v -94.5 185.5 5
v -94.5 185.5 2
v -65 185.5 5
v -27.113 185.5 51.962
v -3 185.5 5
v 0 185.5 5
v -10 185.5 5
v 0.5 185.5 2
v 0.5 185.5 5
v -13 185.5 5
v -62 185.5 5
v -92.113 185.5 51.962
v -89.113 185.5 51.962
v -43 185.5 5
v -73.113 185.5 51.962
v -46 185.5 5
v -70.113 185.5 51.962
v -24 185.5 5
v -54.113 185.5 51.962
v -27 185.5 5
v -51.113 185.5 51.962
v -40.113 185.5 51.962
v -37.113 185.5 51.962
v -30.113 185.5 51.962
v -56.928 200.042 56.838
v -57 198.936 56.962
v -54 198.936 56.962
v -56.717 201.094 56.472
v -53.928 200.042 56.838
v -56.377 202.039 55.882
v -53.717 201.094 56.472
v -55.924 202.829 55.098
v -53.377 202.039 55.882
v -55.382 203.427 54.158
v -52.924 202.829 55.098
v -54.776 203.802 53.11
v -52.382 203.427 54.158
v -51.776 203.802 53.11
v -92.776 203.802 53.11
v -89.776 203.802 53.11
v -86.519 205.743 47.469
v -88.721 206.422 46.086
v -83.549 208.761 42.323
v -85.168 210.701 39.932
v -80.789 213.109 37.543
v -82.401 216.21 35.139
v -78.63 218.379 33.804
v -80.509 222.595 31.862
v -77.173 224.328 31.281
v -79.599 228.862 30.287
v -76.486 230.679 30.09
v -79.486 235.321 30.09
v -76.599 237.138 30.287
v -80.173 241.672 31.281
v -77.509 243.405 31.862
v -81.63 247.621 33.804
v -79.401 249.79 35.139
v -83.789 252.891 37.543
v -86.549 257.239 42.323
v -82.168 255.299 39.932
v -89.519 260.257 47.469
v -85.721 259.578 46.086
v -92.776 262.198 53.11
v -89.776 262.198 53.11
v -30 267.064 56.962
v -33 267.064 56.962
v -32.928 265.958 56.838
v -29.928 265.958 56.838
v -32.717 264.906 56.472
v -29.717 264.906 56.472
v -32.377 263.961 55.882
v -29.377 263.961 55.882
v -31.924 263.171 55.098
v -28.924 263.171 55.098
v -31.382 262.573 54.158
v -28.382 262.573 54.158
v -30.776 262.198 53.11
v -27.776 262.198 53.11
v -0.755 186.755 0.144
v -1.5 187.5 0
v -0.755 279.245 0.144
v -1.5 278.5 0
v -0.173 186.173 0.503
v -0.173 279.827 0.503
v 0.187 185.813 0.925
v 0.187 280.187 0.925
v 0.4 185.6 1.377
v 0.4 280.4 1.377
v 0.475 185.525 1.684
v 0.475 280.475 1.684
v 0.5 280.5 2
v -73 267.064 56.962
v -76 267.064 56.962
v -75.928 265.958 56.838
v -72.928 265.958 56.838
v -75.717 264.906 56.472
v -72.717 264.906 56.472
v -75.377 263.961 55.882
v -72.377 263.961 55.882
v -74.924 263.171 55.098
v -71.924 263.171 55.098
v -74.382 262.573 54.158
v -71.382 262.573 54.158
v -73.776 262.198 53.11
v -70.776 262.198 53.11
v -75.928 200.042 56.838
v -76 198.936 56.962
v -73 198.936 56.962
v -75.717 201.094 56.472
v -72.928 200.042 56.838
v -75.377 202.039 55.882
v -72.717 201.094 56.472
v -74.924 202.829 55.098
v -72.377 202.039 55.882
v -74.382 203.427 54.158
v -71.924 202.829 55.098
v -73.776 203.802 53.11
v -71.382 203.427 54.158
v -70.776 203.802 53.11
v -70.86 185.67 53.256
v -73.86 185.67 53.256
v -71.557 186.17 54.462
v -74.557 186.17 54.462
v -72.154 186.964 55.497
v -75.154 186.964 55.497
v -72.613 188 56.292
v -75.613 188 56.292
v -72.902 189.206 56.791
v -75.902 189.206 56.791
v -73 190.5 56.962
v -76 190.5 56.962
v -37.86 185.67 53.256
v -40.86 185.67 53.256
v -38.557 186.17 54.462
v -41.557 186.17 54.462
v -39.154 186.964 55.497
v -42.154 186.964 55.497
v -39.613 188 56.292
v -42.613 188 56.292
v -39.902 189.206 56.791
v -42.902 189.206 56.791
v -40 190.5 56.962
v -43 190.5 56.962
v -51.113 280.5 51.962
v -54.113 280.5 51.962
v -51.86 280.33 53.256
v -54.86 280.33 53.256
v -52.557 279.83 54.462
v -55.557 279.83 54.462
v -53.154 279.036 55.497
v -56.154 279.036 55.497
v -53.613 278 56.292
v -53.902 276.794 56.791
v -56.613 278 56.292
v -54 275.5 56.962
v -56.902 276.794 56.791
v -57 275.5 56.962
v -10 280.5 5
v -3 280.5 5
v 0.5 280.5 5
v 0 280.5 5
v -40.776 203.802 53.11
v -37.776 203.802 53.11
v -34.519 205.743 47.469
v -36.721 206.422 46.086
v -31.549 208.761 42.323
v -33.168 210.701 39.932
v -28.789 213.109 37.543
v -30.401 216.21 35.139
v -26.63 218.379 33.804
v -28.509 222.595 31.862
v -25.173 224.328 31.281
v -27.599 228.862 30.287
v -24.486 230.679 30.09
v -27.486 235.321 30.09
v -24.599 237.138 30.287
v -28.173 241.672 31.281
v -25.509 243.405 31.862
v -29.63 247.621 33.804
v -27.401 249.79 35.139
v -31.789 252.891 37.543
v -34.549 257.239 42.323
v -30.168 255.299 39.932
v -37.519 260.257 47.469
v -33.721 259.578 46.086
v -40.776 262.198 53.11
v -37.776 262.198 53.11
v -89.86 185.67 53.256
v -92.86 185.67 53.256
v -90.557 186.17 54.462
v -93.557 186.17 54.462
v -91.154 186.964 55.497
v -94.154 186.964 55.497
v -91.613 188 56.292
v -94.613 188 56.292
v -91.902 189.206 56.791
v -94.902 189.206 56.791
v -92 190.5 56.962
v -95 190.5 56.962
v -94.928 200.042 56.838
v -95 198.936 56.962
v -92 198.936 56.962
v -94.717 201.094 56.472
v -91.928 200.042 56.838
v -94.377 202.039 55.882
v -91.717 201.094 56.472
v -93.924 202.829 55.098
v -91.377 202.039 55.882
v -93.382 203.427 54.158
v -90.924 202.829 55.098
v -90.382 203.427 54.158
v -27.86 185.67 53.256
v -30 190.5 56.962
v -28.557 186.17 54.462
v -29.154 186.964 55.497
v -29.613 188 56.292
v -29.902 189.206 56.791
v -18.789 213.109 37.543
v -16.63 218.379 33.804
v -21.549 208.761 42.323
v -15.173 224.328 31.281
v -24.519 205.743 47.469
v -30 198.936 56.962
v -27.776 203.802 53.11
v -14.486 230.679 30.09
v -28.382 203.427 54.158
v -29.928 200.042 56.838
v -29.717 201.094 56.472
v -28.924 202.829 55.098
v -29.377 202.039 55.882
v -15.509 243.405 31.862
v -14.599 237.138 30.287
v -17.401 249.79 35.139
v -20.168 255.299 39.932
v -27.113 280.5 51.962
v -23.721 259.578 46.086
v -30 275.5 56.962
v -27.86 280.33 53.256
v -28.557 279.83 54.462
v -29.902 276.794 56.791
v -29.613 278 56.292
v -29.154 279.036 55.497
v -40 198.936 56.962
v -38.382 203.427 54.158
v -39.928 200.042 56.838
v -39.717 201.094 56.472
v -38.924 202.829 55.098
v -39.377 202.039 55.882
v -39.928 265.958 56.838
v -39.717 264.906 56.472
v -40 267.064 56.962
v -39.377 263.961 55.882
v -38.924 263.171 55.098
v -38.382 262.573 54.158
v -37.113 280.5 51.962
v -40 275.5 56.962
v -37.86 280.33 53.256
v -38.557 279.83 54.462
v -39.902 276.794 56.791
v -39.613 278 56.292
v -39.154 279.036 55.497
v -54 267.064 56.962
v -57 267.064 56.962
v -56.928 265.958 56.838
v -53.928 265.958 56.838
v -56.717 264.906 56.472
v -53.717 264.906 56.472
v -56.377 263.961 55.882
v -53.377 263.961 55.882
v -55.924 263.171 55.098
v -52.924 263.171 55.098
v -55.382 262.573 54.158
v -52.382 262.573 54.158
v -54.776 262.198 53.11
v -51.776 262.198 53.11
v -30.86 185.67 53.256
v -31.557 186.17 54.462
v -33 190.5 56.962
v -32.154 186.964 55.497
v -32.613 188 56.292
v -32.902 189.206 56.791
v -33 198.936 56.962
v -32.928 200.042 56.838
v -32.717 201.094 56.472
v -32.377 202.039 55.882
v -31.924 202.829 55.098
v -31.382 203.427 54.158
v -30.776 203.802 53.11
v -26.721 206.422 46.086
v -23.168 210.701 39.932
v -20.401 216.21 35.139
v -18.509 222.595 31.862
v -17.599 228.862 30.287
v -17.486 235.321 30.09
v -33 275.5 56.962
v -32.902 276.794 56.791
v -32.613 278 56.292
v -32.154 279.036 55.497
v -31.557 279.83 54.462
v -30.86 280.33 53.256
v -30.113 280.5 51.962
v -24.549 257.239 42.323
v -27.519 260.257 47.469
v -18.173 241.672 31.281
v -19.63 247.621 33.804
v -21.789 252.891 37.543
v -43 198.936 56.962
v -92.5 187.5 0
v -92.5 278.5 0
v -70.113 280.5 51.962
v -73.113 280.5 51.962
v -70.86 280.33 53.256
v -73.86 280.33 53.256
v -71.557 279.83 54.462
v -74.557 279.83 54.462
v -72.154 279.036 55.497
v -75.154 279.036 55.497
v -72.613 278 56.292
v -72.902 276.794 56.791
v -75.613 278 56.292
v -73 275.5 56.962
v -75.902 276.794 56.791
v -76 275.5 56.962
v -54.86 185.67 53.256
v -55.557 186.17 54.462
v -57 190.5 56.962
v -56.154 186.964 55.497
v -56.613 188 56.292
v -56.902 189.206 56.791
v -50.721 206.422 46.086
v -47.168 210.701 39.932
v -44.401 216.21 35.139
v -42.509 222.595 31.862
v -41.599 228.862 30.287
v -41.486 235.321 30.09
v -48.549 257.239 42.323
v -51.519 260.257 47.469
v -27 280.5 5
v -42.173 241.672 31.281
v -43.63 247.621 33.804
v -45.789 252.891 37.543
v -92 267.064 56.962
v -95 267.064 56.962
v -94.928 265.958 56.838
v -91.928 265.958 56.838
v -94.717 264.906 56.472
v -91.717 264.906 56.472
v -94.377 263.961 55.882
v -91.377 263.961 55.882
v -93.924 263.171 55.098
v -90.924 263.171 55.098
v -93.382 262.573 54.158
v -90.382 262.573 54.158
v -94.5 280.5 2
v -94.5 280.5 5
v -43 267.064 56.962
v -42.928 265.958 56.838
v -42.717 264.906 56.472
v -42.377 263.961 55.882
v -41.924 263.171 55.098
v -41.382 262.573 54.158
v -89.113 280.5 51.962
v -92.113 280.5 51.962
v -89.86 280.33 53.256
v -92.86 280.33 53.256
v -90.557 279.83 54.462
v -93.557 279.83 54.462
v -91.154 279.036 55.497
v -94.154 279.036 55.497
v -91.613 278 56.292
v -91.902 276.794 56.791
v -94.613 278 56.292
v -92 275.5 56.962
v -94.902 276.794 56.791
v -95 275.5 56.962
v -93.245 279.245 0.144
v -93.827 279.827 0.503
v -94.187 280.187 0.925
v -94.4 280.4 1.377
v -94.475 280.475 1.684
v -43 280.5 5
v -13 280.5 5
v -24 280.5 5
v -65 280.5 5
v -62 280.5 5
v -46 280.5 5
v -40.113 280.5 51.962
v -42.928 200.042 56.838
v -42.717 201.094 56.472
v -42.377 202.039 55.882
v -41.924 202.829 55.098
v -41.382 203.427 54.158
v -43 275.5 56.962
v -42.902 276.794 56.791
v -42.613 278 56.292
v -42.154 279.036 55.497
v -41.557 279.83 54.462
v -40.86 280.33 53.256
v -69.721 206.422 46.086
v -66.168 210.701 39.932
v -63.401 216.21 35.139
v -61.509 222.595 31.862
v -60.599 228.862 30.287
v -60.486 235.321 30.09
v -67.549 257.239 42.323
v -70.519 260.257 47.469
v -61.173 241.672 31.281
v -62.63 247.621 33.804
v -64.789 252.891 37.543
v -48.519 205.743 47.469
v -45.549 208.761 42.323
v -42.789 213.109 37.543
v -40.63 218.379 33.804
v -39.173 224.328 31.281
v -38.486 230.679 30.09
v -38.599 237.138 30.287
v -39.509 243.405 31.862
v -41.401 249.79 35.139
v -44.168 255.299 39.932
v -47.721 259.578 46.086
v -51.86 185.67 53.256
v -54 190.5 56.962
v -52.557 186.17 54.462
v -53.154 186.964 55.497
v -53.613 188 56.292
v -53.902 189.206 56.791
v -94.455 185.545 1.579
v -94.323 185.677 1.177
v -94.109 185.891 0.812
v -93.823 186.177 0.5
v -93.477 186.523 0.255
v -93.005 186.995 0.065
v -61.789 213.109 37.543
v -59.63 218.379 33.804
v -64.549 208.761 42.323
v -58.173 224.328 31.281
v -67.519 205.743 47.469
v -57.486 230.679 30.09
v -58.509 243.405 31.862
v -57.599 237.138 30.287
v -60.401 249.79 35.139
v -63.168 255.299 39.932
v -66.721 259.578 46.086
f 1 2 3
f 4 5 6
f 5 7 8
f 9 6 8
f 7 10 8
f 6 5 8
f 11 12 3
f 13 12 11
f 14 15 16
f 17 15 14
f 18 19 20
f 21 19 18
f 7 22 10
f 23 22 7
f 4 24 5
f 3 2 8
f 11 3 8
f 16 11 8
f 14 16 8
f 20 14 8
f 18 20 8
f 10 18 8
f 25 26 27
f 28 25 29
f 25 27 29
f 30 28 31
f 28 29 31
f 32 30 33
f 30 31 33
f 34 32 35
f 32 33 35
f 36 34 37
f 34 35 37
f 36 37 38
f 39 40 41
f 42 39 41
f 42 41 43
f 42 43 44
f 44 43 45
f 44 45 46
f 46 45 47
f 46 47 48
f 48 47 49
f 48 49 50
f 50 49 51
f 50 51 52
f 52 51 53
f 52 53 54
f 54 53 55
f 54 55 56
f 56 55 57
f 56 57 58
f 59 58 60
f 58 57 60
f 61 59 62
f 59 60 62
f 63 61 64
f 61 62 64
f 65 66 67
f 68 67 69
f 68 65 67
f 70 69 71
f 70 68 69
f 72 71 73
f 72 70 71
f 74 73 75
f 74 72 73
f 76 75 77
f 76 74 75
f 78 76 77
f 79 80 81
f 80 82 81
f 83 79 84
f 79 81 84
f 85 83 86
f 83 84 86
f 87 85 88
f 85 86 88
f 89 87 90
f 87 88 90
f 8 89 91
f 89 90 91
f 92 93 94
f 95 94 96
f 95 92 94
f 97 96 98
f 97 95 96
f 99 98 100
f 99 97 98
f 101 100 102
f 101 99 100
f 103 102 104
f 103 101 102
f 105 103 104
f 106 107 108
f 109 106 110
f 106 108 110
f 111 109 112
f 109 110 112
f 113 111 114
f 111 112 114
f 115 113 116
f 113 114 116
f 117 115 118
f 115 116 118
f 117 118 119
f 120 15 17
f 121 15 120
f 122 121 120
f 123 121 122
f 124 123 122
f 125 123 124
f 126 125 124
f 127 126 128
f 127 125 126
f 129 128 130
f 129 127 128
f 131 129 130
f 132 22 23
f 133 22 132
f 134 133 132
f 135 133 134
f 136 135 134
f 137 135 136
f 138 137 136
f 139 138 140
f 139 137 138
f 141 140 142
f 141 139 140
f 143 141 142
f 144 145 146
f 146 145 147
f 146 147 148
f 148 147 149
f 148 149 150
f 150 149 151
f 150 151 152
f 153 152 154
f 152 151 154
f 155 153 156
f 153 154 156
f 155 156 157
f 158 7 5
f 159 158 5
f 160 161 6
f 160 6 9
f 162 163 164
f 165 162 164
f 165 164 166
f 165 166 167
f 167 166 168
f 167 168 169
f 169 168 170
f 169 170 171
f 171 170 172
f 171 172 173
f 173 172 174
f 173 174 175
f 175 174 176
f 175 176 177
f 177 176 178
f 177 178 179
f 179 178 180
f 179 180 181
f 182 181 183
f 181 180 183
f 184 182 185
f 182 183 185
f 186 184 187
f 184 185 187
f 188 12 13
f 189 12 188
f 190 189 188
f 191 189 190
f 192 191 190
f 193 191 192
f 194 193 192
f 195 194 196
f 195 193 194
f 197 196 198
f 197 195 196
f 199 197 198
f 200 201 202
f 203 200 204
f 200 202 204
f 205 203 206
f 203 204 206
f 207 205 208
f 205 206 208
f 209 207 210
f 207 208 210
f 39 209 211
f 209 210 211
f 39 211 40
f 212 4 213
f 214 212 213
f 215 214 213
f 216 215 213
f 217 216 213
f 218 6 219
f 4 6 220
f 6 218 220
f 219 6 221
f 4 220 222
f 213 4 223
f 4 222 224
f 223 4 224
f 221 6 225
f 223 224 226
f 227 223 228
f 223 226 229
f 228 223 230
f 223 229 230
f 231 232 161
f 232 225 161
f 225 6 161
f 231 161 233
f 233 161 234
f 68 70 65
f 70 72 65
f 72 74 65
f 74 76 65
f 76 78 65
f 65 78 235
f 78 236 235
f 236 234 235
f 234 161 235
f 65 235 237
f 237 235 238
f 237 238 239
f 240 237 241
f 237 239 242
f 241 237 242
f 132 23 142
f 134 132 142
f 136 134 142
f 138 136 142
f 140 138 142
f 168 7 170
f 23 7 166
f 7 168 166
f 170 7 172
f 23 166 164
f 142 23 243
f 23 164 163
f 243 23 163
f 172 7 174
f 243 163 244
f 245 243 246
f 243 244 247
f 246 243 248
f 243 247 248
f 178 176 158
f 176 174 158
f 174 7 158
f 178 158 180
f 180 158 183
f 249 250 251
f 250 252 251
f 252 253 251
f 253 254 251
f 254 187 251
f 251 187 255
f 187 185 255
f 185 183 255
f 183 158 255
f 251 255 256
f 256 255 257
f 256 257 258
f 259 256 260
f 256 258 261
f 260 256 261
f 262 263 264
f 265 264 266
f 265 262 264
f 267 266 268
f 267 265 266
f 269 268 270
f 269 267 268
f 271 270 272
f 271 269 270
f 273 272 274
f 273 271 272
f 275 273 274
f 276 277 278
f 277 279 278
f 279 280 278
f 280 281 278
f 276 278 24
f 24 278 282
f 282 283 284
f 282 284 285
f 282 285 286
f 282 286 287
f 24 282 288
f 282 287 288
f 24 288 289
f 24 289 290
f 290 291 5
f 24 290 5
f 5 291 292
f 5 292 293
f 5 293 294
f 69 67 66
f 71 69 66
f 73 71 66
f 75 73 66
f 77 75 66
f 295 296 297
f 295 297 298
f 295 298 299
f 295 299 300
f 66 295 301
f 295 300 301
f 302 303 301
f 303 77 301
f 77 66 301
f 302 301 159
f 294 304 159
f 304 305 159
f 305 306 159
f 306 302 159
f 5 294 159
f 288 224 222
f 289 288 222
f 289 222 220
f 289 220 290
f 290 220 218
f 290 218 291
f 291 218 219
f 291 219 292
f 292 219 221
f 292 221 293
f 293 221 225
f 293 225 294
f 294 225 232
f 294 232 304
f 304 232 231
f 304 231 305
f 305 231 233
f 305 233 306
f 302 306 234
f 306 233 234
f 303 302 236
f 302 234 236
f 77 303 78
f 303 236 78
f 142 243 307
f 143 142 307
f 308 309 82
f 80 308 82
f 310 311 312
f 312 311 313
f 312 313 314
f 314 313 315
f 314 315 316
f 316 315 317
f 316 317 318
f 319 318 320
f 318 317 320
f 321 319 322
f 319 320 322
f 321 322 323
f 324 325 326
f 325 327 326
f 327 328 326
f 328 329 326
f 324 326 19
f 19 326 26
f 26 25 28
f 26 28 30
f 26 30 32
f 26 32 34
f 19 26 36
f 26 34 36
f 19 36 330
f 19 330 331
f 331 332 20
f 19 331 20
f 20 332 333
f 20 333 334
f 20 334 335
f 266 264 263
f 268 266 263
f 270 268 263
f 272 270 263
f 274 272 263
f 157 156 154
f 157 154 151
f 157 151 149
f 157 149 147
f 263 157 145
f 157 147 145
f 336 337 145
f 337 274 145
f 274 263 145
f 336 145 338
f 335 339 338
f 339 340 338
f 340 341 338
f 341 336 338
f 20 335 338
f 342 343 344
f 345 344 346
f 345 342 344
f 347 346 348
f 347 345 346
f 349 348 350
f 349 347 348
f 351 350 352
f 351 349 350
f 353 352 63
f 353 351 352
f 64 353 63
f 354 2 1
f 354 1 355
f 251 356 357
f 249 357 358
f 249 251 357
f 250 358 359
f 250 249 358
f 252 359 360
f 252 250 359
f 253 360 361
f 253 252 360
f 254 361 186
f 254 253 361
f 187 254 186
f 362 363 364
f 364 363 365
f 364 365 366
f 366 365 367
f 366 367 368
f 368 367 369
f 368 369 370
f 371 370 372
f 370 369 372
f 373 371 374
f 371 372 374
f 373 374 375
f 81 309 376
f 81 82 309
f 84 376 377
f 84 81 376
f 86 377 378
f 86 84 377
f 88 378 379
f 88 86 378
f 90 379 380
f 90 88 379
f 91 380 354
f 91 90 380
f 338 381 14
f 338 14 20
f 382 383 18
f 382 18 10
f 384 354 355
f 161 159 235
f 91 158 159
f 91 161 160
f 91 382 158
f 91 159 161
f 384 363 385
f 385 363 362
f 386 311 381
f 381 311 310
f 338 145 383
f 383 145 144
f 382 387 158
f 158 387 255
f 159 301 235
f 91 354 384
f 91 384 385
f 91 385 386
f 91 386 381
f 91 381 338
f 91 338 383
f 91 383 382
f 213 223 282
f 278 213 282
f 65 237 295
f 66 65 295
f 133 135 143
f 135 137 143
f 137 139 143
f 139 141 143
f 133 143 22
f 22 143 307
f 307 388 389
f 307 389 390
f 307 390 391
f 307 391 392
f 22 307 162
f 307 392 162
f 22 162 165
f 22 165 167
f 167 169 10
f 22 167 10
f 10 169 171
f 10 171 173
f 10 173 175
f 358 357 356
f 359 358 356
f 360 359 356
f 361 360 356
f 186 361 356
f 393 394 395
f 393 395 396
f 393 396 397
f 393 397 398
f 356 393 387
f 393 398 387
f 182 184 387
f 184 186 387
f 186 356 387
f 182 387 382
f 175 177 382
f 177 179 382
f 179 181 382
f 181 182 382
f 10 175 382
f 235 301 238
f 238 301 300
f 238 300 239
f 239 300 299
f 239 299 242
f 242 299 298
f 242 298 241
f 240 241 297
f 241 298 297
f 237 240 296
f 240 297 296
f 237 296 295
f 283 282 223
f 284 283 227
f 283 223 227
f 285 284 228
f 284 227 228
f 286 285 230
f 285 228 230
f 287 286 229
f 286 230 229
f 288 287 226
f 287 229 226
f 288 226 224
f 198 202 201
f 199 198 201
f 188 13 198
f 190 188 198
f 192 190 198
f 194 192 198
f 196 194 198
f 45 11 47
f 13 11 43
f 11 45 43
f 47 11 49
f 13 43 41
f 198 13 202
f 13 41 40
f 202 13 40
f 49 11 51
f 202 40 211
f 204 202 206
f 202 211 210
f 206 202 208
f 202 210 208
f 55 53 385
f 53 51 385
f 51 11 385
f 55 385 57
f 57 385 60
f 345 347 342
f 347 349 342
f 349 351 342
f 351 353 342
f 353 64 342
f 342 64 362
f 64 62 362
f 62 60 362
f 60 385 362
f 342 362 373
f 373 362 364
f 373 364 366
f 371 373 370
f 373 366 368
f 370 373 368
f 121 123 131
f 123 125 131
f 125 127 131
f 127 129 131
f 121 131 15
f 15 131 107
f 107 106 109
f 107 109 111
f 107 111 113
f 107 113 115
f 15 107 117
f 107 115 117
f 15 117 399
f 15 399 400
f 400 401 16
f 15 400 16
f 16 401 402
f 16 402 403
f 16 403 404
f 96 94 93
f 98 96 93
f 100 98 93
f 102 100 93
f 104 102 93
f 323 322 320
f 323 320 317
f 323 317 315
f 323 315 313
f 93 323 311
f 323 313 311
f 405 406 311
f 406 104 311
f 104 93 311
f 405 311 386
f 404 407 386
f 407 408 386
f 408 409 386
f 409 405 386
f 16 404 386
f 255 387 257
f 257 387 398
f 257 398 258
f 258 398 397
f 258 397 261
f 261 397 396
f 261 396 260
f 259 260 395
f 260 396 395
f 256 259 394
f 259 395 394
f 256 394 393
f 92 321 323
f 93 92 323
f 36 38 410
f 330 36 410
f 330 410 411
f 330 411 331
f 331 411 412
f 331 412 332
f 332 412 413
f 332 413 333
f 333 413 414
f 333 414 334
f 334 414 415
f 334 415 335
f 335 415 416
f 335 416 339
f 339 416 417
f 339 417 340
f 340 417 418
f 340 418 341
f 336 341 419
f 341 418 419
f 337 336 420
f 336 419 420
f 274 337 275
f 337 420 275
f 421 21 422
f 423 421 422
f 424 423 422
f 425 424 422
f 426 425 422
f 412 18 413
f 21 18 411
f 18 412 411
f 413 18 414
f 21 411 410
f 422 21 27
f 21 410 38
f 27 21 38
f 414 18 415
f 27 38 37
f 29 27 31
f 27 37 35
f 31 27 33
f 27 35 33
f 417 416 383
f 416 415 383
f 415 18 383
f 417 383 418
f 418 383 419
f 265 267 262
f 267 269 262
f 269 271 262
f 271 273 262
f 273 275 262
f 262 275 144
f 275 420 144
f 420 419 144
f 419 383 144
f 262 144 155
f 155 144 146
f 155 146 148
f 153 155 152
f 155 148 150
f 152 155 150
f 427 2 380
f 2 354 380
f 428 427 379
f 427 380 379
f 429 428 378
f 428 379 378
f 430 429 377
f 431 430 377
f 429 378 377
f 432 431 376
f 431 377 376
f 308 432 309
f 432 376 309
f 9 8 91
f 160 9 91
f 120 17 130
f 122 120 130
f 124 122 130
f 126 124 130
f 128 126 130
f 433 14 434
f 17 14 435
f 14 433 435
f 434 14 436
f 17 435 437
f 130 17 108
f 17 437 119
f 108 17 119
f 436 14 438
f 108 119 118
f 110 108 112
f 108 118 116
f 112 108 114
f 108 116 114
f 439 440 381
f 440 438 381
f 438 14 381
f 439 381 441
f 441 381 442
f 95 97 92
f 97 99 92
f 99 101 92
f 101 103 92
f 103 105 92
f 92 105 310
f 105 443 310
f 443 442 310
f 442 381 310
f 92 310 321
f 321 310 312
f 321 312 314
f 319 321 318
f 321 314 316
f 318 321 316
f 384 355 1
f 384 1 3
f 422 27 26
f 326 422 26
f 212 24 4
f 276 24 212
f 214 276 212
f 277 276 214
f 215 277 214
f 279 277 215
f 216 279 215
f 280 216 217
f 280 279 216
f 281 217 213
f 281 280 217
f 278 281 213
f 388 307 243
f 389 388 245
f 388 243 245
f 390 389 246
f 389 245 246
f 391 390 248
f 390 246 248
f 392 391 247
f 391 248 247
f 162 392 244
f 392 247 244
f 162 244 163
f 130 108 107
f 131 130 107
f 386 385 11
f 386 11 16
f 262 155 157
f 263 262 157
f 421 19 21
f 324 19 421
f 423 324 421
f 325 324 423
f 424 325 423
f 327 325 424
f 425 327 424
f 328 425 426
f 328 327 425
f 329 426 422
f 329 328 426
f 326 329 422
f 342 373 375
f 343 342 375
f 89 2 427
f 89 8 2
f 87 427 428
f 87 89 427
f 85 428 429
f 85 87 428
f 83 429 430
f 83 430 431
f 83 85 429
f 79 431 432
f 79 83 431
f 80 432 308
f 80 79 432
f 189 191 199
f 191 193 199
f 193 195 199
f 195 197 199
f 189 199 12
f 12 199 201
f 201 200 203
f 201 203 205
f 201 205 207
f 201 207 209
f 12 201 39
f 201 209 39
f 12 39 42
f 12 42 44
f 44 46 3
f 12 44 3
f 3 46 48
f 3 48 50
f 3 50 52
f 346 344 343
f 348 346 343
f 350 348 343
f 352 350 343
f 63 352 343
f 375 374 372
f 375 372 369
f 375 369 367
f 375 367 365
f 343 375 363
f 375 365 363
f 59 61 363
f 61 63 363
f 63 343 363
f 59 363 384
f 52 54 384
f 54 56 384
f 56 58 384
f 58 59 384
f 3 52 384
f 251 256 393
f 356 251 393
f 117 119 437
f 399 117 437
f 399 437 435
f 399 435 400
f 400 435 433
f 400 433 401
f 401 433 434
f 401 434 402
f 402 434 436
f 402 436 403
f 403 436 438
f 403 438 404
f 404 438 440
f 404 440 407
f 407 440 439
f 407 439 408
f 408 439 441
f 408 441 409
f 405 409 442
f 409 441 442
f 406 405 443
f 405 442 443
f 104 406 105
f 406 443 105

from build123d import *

# Parameters (mm, degrees)
SKETCH026_W     = 95
SKETCH026_H     = 95
PAD018_DEPTH    = 5
PAD019_DEPTH    = 95
SKETCH028_R     = 30
POCKET008_DEPTH = 95.501
FILLET020_R     = 5
FILLET021_R     = 2


with BuildPart() as part:
    # Sketch026 → Pad018 (new body)
    with BuildSketch(Plane.XY):
        Rectangle(SKETCH026_W, SKETCH026_H)
    extrude(amount=PAD018_DEPTH)

    # Sketch027 (on DatumPlane) → Pad019 (join)
    with BuildSketch(Plane(origin=(0, 47.5, 0), x_dir=(-1, 0, 0), z_dir=(0, 1, 0))):
        Polygon((-47, 5), (-17, 56.961524), (-14, 56.961524), (-44, 5), align=None)
        Polygon((-37, 5), (-7, 56.961524), (-4, 56.961524), (-34, 5), align=None)
        Polygon((-23, 5), (7, 56.961524), (10, 56.961524), (-20, 5), align=None)
        Polygon((-4, 5), (26, 56.961524), (29, 56.961524), (-1, 5), align=None)
        Polygon((15, 5), (45, 56.961524), (48, 56.961524), (18, 5), align=None)
    extrude(amount=-PAD019_DEPTH)

    # Sketch028 (on DatumPlane) → Pocket008 (cut, through all)
    with BuildSketch(Plane.YZ.offset(47.5)):
        with Locations((0, 60)):
            Circle(SKETCH028_R)
    extrude(amount=-POCKET008_DEPTH, mode=Mode.SUBTRACT)

    # Fillet020
    fillet020_edges = [part.edges().sort_by_distance(p)[0] for p in [
        (15.5, -47.5, 56.961524),
        (15.5, -29.845731, 56.961524),
        (5.5, -47.5, 56.961524),
        (5.5, -29.845731, 56.961524),
        (-8.5, -47.5, 56.961524),
        (-8.5, -29.845731, 56.961524),
        (-27.5, -47.5, 56.961524),
        (-27.5, -29.845731, 56.961524),
        (-46.5, -47.5, 56.961524),
        (-46.5, -29.845731, 56.961524),
        (15.5, 29.845731, 56.961524),
        (15.5, 47.5, 56.961524),
        (5.5, 29.845731, 56.961524),
        (5.5, 47.5, 56.961524),
        (-8.5, 29.845731, 56.961524),
        (-8.5, 47.5, 56.961524),
        (-27.5, 29.845731, 56.961524),
        (-27.5, 47.5, 56.961524),
        (-46.5, 29.845731, 56.961524),
        (-46.5, 47.5, 56.961524),
    ]]
    fillet(fillet020_edges, radius=FILLET020_R)

    # Fillet021
    fillet021_edges = [part.edges().sort_by_distance(p)[0] for p in [
        (0, 47.5, 0),
        (47.5, 0, 0),
        (0, -47.5, 0),
        (-47.5, 0, 0),
    ]]
    fillet(fillet021_edges, radius=FILLET021_R)


with BuildPart() as part_1:
    # Body012 placement: moved
    add(part.part.moved(Location((-47, 233, 0))))


solid = part_1.part
